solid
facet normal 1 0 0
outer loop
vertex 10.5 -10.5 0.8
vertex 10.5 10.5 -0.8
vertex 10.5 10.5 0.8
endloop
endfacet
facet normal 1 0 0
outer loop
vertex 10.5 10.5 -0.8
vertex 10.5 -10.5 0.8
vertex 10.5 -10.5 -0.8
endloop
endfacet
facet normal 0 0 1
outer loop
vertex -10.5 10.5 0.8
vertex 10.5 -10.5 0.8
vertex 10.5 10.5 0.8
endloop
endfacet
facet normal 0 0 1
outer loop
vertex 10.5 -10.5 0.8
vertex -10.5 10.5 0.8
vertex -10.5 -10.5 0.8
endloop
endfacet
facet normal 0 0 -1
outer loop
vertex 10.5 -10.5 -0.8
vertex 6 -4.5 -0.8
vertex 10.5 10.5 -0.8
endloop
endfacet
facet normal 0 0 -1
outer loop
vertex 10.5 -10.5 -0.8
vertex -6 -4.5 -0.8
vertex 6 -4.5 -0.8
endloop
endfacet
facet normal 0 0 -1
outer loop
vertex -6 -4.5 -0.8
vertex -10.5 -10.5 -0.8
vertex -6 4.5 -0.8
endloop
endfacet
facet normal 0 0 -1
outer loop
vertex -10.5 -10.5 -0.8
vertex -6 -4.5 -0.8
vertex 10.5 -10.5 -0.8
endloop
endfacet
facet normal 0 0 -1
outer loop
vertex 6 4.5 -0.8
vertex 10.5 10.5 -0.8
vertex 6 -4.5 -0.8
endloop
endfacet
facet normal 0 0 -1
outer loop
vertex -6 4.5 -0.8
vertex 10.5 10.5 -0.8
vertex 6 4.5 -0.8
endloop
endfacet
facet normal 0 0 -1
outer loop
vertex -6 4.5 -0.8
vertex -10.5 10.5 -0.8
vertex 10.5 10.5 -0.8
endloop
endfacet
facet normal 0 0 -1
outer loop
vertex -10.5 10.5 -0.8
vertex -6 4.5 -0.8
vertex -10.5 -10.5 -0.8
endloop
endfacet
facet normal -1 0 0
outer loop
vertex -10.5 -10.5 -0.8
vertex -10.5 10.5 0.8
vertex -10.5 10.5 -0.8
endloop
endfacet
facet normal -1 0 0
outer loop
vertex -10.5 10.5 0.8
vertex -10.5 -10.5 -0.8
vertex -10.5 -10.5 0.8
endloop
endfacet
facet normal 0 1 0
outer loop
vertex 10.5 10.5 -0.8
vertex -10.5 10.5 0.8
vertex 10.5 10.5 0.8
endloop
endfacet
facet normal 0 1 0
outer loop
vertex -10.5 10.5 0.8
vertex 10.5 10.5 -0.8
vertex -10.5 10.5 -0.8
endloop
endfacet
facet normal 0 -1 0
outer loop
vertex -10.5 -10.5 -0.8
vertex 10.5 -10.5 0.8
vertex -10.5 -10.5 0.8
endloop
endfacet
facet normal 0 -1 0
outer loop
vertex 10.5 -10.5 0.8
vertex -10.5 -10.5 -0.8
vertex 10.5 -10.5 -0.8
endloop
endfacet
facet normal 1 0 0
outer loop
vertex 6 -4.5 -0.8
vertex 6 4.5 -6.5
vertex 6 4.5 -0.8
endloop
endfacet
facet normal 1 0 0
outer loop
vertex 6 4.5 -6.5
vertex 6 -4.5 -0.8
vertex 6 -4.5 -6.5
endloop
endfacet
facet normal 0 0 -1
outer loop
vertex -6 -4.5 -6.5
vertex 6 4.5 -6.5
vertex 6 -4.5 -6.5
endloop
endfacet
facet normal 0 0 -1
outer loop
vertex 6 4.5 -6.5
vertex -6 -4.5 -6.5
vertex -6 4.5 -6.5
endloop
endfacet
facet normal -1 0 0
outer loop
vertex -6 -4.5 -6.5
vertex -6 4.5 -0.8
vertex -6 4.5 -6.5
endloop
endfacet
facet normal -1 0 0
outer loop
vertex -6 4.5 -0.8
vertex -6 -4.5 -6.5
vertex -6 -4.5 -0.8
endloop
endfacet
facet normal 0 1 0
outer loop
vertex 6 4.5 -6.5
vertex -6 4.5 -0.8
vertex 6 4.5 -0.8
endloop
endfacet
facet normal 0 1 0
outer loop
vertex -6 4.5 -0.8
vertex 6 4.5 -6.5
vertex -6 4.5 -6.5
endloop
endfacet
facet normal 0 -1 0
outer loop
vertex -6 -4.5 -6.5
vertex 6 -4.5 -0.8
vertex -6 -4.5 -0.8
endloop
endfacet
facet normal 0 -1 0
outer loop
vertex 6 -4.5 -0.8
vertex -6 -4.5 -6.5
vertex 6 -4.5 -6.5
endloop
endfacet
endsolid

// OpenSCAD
module pmw_mod() {
    color("green") cube([21, 21, 1.6], center = true);
    translate([0, 0, -3.5]) color("gray") cube([12, 9, 6], center = true);
}
pmw_mod();
